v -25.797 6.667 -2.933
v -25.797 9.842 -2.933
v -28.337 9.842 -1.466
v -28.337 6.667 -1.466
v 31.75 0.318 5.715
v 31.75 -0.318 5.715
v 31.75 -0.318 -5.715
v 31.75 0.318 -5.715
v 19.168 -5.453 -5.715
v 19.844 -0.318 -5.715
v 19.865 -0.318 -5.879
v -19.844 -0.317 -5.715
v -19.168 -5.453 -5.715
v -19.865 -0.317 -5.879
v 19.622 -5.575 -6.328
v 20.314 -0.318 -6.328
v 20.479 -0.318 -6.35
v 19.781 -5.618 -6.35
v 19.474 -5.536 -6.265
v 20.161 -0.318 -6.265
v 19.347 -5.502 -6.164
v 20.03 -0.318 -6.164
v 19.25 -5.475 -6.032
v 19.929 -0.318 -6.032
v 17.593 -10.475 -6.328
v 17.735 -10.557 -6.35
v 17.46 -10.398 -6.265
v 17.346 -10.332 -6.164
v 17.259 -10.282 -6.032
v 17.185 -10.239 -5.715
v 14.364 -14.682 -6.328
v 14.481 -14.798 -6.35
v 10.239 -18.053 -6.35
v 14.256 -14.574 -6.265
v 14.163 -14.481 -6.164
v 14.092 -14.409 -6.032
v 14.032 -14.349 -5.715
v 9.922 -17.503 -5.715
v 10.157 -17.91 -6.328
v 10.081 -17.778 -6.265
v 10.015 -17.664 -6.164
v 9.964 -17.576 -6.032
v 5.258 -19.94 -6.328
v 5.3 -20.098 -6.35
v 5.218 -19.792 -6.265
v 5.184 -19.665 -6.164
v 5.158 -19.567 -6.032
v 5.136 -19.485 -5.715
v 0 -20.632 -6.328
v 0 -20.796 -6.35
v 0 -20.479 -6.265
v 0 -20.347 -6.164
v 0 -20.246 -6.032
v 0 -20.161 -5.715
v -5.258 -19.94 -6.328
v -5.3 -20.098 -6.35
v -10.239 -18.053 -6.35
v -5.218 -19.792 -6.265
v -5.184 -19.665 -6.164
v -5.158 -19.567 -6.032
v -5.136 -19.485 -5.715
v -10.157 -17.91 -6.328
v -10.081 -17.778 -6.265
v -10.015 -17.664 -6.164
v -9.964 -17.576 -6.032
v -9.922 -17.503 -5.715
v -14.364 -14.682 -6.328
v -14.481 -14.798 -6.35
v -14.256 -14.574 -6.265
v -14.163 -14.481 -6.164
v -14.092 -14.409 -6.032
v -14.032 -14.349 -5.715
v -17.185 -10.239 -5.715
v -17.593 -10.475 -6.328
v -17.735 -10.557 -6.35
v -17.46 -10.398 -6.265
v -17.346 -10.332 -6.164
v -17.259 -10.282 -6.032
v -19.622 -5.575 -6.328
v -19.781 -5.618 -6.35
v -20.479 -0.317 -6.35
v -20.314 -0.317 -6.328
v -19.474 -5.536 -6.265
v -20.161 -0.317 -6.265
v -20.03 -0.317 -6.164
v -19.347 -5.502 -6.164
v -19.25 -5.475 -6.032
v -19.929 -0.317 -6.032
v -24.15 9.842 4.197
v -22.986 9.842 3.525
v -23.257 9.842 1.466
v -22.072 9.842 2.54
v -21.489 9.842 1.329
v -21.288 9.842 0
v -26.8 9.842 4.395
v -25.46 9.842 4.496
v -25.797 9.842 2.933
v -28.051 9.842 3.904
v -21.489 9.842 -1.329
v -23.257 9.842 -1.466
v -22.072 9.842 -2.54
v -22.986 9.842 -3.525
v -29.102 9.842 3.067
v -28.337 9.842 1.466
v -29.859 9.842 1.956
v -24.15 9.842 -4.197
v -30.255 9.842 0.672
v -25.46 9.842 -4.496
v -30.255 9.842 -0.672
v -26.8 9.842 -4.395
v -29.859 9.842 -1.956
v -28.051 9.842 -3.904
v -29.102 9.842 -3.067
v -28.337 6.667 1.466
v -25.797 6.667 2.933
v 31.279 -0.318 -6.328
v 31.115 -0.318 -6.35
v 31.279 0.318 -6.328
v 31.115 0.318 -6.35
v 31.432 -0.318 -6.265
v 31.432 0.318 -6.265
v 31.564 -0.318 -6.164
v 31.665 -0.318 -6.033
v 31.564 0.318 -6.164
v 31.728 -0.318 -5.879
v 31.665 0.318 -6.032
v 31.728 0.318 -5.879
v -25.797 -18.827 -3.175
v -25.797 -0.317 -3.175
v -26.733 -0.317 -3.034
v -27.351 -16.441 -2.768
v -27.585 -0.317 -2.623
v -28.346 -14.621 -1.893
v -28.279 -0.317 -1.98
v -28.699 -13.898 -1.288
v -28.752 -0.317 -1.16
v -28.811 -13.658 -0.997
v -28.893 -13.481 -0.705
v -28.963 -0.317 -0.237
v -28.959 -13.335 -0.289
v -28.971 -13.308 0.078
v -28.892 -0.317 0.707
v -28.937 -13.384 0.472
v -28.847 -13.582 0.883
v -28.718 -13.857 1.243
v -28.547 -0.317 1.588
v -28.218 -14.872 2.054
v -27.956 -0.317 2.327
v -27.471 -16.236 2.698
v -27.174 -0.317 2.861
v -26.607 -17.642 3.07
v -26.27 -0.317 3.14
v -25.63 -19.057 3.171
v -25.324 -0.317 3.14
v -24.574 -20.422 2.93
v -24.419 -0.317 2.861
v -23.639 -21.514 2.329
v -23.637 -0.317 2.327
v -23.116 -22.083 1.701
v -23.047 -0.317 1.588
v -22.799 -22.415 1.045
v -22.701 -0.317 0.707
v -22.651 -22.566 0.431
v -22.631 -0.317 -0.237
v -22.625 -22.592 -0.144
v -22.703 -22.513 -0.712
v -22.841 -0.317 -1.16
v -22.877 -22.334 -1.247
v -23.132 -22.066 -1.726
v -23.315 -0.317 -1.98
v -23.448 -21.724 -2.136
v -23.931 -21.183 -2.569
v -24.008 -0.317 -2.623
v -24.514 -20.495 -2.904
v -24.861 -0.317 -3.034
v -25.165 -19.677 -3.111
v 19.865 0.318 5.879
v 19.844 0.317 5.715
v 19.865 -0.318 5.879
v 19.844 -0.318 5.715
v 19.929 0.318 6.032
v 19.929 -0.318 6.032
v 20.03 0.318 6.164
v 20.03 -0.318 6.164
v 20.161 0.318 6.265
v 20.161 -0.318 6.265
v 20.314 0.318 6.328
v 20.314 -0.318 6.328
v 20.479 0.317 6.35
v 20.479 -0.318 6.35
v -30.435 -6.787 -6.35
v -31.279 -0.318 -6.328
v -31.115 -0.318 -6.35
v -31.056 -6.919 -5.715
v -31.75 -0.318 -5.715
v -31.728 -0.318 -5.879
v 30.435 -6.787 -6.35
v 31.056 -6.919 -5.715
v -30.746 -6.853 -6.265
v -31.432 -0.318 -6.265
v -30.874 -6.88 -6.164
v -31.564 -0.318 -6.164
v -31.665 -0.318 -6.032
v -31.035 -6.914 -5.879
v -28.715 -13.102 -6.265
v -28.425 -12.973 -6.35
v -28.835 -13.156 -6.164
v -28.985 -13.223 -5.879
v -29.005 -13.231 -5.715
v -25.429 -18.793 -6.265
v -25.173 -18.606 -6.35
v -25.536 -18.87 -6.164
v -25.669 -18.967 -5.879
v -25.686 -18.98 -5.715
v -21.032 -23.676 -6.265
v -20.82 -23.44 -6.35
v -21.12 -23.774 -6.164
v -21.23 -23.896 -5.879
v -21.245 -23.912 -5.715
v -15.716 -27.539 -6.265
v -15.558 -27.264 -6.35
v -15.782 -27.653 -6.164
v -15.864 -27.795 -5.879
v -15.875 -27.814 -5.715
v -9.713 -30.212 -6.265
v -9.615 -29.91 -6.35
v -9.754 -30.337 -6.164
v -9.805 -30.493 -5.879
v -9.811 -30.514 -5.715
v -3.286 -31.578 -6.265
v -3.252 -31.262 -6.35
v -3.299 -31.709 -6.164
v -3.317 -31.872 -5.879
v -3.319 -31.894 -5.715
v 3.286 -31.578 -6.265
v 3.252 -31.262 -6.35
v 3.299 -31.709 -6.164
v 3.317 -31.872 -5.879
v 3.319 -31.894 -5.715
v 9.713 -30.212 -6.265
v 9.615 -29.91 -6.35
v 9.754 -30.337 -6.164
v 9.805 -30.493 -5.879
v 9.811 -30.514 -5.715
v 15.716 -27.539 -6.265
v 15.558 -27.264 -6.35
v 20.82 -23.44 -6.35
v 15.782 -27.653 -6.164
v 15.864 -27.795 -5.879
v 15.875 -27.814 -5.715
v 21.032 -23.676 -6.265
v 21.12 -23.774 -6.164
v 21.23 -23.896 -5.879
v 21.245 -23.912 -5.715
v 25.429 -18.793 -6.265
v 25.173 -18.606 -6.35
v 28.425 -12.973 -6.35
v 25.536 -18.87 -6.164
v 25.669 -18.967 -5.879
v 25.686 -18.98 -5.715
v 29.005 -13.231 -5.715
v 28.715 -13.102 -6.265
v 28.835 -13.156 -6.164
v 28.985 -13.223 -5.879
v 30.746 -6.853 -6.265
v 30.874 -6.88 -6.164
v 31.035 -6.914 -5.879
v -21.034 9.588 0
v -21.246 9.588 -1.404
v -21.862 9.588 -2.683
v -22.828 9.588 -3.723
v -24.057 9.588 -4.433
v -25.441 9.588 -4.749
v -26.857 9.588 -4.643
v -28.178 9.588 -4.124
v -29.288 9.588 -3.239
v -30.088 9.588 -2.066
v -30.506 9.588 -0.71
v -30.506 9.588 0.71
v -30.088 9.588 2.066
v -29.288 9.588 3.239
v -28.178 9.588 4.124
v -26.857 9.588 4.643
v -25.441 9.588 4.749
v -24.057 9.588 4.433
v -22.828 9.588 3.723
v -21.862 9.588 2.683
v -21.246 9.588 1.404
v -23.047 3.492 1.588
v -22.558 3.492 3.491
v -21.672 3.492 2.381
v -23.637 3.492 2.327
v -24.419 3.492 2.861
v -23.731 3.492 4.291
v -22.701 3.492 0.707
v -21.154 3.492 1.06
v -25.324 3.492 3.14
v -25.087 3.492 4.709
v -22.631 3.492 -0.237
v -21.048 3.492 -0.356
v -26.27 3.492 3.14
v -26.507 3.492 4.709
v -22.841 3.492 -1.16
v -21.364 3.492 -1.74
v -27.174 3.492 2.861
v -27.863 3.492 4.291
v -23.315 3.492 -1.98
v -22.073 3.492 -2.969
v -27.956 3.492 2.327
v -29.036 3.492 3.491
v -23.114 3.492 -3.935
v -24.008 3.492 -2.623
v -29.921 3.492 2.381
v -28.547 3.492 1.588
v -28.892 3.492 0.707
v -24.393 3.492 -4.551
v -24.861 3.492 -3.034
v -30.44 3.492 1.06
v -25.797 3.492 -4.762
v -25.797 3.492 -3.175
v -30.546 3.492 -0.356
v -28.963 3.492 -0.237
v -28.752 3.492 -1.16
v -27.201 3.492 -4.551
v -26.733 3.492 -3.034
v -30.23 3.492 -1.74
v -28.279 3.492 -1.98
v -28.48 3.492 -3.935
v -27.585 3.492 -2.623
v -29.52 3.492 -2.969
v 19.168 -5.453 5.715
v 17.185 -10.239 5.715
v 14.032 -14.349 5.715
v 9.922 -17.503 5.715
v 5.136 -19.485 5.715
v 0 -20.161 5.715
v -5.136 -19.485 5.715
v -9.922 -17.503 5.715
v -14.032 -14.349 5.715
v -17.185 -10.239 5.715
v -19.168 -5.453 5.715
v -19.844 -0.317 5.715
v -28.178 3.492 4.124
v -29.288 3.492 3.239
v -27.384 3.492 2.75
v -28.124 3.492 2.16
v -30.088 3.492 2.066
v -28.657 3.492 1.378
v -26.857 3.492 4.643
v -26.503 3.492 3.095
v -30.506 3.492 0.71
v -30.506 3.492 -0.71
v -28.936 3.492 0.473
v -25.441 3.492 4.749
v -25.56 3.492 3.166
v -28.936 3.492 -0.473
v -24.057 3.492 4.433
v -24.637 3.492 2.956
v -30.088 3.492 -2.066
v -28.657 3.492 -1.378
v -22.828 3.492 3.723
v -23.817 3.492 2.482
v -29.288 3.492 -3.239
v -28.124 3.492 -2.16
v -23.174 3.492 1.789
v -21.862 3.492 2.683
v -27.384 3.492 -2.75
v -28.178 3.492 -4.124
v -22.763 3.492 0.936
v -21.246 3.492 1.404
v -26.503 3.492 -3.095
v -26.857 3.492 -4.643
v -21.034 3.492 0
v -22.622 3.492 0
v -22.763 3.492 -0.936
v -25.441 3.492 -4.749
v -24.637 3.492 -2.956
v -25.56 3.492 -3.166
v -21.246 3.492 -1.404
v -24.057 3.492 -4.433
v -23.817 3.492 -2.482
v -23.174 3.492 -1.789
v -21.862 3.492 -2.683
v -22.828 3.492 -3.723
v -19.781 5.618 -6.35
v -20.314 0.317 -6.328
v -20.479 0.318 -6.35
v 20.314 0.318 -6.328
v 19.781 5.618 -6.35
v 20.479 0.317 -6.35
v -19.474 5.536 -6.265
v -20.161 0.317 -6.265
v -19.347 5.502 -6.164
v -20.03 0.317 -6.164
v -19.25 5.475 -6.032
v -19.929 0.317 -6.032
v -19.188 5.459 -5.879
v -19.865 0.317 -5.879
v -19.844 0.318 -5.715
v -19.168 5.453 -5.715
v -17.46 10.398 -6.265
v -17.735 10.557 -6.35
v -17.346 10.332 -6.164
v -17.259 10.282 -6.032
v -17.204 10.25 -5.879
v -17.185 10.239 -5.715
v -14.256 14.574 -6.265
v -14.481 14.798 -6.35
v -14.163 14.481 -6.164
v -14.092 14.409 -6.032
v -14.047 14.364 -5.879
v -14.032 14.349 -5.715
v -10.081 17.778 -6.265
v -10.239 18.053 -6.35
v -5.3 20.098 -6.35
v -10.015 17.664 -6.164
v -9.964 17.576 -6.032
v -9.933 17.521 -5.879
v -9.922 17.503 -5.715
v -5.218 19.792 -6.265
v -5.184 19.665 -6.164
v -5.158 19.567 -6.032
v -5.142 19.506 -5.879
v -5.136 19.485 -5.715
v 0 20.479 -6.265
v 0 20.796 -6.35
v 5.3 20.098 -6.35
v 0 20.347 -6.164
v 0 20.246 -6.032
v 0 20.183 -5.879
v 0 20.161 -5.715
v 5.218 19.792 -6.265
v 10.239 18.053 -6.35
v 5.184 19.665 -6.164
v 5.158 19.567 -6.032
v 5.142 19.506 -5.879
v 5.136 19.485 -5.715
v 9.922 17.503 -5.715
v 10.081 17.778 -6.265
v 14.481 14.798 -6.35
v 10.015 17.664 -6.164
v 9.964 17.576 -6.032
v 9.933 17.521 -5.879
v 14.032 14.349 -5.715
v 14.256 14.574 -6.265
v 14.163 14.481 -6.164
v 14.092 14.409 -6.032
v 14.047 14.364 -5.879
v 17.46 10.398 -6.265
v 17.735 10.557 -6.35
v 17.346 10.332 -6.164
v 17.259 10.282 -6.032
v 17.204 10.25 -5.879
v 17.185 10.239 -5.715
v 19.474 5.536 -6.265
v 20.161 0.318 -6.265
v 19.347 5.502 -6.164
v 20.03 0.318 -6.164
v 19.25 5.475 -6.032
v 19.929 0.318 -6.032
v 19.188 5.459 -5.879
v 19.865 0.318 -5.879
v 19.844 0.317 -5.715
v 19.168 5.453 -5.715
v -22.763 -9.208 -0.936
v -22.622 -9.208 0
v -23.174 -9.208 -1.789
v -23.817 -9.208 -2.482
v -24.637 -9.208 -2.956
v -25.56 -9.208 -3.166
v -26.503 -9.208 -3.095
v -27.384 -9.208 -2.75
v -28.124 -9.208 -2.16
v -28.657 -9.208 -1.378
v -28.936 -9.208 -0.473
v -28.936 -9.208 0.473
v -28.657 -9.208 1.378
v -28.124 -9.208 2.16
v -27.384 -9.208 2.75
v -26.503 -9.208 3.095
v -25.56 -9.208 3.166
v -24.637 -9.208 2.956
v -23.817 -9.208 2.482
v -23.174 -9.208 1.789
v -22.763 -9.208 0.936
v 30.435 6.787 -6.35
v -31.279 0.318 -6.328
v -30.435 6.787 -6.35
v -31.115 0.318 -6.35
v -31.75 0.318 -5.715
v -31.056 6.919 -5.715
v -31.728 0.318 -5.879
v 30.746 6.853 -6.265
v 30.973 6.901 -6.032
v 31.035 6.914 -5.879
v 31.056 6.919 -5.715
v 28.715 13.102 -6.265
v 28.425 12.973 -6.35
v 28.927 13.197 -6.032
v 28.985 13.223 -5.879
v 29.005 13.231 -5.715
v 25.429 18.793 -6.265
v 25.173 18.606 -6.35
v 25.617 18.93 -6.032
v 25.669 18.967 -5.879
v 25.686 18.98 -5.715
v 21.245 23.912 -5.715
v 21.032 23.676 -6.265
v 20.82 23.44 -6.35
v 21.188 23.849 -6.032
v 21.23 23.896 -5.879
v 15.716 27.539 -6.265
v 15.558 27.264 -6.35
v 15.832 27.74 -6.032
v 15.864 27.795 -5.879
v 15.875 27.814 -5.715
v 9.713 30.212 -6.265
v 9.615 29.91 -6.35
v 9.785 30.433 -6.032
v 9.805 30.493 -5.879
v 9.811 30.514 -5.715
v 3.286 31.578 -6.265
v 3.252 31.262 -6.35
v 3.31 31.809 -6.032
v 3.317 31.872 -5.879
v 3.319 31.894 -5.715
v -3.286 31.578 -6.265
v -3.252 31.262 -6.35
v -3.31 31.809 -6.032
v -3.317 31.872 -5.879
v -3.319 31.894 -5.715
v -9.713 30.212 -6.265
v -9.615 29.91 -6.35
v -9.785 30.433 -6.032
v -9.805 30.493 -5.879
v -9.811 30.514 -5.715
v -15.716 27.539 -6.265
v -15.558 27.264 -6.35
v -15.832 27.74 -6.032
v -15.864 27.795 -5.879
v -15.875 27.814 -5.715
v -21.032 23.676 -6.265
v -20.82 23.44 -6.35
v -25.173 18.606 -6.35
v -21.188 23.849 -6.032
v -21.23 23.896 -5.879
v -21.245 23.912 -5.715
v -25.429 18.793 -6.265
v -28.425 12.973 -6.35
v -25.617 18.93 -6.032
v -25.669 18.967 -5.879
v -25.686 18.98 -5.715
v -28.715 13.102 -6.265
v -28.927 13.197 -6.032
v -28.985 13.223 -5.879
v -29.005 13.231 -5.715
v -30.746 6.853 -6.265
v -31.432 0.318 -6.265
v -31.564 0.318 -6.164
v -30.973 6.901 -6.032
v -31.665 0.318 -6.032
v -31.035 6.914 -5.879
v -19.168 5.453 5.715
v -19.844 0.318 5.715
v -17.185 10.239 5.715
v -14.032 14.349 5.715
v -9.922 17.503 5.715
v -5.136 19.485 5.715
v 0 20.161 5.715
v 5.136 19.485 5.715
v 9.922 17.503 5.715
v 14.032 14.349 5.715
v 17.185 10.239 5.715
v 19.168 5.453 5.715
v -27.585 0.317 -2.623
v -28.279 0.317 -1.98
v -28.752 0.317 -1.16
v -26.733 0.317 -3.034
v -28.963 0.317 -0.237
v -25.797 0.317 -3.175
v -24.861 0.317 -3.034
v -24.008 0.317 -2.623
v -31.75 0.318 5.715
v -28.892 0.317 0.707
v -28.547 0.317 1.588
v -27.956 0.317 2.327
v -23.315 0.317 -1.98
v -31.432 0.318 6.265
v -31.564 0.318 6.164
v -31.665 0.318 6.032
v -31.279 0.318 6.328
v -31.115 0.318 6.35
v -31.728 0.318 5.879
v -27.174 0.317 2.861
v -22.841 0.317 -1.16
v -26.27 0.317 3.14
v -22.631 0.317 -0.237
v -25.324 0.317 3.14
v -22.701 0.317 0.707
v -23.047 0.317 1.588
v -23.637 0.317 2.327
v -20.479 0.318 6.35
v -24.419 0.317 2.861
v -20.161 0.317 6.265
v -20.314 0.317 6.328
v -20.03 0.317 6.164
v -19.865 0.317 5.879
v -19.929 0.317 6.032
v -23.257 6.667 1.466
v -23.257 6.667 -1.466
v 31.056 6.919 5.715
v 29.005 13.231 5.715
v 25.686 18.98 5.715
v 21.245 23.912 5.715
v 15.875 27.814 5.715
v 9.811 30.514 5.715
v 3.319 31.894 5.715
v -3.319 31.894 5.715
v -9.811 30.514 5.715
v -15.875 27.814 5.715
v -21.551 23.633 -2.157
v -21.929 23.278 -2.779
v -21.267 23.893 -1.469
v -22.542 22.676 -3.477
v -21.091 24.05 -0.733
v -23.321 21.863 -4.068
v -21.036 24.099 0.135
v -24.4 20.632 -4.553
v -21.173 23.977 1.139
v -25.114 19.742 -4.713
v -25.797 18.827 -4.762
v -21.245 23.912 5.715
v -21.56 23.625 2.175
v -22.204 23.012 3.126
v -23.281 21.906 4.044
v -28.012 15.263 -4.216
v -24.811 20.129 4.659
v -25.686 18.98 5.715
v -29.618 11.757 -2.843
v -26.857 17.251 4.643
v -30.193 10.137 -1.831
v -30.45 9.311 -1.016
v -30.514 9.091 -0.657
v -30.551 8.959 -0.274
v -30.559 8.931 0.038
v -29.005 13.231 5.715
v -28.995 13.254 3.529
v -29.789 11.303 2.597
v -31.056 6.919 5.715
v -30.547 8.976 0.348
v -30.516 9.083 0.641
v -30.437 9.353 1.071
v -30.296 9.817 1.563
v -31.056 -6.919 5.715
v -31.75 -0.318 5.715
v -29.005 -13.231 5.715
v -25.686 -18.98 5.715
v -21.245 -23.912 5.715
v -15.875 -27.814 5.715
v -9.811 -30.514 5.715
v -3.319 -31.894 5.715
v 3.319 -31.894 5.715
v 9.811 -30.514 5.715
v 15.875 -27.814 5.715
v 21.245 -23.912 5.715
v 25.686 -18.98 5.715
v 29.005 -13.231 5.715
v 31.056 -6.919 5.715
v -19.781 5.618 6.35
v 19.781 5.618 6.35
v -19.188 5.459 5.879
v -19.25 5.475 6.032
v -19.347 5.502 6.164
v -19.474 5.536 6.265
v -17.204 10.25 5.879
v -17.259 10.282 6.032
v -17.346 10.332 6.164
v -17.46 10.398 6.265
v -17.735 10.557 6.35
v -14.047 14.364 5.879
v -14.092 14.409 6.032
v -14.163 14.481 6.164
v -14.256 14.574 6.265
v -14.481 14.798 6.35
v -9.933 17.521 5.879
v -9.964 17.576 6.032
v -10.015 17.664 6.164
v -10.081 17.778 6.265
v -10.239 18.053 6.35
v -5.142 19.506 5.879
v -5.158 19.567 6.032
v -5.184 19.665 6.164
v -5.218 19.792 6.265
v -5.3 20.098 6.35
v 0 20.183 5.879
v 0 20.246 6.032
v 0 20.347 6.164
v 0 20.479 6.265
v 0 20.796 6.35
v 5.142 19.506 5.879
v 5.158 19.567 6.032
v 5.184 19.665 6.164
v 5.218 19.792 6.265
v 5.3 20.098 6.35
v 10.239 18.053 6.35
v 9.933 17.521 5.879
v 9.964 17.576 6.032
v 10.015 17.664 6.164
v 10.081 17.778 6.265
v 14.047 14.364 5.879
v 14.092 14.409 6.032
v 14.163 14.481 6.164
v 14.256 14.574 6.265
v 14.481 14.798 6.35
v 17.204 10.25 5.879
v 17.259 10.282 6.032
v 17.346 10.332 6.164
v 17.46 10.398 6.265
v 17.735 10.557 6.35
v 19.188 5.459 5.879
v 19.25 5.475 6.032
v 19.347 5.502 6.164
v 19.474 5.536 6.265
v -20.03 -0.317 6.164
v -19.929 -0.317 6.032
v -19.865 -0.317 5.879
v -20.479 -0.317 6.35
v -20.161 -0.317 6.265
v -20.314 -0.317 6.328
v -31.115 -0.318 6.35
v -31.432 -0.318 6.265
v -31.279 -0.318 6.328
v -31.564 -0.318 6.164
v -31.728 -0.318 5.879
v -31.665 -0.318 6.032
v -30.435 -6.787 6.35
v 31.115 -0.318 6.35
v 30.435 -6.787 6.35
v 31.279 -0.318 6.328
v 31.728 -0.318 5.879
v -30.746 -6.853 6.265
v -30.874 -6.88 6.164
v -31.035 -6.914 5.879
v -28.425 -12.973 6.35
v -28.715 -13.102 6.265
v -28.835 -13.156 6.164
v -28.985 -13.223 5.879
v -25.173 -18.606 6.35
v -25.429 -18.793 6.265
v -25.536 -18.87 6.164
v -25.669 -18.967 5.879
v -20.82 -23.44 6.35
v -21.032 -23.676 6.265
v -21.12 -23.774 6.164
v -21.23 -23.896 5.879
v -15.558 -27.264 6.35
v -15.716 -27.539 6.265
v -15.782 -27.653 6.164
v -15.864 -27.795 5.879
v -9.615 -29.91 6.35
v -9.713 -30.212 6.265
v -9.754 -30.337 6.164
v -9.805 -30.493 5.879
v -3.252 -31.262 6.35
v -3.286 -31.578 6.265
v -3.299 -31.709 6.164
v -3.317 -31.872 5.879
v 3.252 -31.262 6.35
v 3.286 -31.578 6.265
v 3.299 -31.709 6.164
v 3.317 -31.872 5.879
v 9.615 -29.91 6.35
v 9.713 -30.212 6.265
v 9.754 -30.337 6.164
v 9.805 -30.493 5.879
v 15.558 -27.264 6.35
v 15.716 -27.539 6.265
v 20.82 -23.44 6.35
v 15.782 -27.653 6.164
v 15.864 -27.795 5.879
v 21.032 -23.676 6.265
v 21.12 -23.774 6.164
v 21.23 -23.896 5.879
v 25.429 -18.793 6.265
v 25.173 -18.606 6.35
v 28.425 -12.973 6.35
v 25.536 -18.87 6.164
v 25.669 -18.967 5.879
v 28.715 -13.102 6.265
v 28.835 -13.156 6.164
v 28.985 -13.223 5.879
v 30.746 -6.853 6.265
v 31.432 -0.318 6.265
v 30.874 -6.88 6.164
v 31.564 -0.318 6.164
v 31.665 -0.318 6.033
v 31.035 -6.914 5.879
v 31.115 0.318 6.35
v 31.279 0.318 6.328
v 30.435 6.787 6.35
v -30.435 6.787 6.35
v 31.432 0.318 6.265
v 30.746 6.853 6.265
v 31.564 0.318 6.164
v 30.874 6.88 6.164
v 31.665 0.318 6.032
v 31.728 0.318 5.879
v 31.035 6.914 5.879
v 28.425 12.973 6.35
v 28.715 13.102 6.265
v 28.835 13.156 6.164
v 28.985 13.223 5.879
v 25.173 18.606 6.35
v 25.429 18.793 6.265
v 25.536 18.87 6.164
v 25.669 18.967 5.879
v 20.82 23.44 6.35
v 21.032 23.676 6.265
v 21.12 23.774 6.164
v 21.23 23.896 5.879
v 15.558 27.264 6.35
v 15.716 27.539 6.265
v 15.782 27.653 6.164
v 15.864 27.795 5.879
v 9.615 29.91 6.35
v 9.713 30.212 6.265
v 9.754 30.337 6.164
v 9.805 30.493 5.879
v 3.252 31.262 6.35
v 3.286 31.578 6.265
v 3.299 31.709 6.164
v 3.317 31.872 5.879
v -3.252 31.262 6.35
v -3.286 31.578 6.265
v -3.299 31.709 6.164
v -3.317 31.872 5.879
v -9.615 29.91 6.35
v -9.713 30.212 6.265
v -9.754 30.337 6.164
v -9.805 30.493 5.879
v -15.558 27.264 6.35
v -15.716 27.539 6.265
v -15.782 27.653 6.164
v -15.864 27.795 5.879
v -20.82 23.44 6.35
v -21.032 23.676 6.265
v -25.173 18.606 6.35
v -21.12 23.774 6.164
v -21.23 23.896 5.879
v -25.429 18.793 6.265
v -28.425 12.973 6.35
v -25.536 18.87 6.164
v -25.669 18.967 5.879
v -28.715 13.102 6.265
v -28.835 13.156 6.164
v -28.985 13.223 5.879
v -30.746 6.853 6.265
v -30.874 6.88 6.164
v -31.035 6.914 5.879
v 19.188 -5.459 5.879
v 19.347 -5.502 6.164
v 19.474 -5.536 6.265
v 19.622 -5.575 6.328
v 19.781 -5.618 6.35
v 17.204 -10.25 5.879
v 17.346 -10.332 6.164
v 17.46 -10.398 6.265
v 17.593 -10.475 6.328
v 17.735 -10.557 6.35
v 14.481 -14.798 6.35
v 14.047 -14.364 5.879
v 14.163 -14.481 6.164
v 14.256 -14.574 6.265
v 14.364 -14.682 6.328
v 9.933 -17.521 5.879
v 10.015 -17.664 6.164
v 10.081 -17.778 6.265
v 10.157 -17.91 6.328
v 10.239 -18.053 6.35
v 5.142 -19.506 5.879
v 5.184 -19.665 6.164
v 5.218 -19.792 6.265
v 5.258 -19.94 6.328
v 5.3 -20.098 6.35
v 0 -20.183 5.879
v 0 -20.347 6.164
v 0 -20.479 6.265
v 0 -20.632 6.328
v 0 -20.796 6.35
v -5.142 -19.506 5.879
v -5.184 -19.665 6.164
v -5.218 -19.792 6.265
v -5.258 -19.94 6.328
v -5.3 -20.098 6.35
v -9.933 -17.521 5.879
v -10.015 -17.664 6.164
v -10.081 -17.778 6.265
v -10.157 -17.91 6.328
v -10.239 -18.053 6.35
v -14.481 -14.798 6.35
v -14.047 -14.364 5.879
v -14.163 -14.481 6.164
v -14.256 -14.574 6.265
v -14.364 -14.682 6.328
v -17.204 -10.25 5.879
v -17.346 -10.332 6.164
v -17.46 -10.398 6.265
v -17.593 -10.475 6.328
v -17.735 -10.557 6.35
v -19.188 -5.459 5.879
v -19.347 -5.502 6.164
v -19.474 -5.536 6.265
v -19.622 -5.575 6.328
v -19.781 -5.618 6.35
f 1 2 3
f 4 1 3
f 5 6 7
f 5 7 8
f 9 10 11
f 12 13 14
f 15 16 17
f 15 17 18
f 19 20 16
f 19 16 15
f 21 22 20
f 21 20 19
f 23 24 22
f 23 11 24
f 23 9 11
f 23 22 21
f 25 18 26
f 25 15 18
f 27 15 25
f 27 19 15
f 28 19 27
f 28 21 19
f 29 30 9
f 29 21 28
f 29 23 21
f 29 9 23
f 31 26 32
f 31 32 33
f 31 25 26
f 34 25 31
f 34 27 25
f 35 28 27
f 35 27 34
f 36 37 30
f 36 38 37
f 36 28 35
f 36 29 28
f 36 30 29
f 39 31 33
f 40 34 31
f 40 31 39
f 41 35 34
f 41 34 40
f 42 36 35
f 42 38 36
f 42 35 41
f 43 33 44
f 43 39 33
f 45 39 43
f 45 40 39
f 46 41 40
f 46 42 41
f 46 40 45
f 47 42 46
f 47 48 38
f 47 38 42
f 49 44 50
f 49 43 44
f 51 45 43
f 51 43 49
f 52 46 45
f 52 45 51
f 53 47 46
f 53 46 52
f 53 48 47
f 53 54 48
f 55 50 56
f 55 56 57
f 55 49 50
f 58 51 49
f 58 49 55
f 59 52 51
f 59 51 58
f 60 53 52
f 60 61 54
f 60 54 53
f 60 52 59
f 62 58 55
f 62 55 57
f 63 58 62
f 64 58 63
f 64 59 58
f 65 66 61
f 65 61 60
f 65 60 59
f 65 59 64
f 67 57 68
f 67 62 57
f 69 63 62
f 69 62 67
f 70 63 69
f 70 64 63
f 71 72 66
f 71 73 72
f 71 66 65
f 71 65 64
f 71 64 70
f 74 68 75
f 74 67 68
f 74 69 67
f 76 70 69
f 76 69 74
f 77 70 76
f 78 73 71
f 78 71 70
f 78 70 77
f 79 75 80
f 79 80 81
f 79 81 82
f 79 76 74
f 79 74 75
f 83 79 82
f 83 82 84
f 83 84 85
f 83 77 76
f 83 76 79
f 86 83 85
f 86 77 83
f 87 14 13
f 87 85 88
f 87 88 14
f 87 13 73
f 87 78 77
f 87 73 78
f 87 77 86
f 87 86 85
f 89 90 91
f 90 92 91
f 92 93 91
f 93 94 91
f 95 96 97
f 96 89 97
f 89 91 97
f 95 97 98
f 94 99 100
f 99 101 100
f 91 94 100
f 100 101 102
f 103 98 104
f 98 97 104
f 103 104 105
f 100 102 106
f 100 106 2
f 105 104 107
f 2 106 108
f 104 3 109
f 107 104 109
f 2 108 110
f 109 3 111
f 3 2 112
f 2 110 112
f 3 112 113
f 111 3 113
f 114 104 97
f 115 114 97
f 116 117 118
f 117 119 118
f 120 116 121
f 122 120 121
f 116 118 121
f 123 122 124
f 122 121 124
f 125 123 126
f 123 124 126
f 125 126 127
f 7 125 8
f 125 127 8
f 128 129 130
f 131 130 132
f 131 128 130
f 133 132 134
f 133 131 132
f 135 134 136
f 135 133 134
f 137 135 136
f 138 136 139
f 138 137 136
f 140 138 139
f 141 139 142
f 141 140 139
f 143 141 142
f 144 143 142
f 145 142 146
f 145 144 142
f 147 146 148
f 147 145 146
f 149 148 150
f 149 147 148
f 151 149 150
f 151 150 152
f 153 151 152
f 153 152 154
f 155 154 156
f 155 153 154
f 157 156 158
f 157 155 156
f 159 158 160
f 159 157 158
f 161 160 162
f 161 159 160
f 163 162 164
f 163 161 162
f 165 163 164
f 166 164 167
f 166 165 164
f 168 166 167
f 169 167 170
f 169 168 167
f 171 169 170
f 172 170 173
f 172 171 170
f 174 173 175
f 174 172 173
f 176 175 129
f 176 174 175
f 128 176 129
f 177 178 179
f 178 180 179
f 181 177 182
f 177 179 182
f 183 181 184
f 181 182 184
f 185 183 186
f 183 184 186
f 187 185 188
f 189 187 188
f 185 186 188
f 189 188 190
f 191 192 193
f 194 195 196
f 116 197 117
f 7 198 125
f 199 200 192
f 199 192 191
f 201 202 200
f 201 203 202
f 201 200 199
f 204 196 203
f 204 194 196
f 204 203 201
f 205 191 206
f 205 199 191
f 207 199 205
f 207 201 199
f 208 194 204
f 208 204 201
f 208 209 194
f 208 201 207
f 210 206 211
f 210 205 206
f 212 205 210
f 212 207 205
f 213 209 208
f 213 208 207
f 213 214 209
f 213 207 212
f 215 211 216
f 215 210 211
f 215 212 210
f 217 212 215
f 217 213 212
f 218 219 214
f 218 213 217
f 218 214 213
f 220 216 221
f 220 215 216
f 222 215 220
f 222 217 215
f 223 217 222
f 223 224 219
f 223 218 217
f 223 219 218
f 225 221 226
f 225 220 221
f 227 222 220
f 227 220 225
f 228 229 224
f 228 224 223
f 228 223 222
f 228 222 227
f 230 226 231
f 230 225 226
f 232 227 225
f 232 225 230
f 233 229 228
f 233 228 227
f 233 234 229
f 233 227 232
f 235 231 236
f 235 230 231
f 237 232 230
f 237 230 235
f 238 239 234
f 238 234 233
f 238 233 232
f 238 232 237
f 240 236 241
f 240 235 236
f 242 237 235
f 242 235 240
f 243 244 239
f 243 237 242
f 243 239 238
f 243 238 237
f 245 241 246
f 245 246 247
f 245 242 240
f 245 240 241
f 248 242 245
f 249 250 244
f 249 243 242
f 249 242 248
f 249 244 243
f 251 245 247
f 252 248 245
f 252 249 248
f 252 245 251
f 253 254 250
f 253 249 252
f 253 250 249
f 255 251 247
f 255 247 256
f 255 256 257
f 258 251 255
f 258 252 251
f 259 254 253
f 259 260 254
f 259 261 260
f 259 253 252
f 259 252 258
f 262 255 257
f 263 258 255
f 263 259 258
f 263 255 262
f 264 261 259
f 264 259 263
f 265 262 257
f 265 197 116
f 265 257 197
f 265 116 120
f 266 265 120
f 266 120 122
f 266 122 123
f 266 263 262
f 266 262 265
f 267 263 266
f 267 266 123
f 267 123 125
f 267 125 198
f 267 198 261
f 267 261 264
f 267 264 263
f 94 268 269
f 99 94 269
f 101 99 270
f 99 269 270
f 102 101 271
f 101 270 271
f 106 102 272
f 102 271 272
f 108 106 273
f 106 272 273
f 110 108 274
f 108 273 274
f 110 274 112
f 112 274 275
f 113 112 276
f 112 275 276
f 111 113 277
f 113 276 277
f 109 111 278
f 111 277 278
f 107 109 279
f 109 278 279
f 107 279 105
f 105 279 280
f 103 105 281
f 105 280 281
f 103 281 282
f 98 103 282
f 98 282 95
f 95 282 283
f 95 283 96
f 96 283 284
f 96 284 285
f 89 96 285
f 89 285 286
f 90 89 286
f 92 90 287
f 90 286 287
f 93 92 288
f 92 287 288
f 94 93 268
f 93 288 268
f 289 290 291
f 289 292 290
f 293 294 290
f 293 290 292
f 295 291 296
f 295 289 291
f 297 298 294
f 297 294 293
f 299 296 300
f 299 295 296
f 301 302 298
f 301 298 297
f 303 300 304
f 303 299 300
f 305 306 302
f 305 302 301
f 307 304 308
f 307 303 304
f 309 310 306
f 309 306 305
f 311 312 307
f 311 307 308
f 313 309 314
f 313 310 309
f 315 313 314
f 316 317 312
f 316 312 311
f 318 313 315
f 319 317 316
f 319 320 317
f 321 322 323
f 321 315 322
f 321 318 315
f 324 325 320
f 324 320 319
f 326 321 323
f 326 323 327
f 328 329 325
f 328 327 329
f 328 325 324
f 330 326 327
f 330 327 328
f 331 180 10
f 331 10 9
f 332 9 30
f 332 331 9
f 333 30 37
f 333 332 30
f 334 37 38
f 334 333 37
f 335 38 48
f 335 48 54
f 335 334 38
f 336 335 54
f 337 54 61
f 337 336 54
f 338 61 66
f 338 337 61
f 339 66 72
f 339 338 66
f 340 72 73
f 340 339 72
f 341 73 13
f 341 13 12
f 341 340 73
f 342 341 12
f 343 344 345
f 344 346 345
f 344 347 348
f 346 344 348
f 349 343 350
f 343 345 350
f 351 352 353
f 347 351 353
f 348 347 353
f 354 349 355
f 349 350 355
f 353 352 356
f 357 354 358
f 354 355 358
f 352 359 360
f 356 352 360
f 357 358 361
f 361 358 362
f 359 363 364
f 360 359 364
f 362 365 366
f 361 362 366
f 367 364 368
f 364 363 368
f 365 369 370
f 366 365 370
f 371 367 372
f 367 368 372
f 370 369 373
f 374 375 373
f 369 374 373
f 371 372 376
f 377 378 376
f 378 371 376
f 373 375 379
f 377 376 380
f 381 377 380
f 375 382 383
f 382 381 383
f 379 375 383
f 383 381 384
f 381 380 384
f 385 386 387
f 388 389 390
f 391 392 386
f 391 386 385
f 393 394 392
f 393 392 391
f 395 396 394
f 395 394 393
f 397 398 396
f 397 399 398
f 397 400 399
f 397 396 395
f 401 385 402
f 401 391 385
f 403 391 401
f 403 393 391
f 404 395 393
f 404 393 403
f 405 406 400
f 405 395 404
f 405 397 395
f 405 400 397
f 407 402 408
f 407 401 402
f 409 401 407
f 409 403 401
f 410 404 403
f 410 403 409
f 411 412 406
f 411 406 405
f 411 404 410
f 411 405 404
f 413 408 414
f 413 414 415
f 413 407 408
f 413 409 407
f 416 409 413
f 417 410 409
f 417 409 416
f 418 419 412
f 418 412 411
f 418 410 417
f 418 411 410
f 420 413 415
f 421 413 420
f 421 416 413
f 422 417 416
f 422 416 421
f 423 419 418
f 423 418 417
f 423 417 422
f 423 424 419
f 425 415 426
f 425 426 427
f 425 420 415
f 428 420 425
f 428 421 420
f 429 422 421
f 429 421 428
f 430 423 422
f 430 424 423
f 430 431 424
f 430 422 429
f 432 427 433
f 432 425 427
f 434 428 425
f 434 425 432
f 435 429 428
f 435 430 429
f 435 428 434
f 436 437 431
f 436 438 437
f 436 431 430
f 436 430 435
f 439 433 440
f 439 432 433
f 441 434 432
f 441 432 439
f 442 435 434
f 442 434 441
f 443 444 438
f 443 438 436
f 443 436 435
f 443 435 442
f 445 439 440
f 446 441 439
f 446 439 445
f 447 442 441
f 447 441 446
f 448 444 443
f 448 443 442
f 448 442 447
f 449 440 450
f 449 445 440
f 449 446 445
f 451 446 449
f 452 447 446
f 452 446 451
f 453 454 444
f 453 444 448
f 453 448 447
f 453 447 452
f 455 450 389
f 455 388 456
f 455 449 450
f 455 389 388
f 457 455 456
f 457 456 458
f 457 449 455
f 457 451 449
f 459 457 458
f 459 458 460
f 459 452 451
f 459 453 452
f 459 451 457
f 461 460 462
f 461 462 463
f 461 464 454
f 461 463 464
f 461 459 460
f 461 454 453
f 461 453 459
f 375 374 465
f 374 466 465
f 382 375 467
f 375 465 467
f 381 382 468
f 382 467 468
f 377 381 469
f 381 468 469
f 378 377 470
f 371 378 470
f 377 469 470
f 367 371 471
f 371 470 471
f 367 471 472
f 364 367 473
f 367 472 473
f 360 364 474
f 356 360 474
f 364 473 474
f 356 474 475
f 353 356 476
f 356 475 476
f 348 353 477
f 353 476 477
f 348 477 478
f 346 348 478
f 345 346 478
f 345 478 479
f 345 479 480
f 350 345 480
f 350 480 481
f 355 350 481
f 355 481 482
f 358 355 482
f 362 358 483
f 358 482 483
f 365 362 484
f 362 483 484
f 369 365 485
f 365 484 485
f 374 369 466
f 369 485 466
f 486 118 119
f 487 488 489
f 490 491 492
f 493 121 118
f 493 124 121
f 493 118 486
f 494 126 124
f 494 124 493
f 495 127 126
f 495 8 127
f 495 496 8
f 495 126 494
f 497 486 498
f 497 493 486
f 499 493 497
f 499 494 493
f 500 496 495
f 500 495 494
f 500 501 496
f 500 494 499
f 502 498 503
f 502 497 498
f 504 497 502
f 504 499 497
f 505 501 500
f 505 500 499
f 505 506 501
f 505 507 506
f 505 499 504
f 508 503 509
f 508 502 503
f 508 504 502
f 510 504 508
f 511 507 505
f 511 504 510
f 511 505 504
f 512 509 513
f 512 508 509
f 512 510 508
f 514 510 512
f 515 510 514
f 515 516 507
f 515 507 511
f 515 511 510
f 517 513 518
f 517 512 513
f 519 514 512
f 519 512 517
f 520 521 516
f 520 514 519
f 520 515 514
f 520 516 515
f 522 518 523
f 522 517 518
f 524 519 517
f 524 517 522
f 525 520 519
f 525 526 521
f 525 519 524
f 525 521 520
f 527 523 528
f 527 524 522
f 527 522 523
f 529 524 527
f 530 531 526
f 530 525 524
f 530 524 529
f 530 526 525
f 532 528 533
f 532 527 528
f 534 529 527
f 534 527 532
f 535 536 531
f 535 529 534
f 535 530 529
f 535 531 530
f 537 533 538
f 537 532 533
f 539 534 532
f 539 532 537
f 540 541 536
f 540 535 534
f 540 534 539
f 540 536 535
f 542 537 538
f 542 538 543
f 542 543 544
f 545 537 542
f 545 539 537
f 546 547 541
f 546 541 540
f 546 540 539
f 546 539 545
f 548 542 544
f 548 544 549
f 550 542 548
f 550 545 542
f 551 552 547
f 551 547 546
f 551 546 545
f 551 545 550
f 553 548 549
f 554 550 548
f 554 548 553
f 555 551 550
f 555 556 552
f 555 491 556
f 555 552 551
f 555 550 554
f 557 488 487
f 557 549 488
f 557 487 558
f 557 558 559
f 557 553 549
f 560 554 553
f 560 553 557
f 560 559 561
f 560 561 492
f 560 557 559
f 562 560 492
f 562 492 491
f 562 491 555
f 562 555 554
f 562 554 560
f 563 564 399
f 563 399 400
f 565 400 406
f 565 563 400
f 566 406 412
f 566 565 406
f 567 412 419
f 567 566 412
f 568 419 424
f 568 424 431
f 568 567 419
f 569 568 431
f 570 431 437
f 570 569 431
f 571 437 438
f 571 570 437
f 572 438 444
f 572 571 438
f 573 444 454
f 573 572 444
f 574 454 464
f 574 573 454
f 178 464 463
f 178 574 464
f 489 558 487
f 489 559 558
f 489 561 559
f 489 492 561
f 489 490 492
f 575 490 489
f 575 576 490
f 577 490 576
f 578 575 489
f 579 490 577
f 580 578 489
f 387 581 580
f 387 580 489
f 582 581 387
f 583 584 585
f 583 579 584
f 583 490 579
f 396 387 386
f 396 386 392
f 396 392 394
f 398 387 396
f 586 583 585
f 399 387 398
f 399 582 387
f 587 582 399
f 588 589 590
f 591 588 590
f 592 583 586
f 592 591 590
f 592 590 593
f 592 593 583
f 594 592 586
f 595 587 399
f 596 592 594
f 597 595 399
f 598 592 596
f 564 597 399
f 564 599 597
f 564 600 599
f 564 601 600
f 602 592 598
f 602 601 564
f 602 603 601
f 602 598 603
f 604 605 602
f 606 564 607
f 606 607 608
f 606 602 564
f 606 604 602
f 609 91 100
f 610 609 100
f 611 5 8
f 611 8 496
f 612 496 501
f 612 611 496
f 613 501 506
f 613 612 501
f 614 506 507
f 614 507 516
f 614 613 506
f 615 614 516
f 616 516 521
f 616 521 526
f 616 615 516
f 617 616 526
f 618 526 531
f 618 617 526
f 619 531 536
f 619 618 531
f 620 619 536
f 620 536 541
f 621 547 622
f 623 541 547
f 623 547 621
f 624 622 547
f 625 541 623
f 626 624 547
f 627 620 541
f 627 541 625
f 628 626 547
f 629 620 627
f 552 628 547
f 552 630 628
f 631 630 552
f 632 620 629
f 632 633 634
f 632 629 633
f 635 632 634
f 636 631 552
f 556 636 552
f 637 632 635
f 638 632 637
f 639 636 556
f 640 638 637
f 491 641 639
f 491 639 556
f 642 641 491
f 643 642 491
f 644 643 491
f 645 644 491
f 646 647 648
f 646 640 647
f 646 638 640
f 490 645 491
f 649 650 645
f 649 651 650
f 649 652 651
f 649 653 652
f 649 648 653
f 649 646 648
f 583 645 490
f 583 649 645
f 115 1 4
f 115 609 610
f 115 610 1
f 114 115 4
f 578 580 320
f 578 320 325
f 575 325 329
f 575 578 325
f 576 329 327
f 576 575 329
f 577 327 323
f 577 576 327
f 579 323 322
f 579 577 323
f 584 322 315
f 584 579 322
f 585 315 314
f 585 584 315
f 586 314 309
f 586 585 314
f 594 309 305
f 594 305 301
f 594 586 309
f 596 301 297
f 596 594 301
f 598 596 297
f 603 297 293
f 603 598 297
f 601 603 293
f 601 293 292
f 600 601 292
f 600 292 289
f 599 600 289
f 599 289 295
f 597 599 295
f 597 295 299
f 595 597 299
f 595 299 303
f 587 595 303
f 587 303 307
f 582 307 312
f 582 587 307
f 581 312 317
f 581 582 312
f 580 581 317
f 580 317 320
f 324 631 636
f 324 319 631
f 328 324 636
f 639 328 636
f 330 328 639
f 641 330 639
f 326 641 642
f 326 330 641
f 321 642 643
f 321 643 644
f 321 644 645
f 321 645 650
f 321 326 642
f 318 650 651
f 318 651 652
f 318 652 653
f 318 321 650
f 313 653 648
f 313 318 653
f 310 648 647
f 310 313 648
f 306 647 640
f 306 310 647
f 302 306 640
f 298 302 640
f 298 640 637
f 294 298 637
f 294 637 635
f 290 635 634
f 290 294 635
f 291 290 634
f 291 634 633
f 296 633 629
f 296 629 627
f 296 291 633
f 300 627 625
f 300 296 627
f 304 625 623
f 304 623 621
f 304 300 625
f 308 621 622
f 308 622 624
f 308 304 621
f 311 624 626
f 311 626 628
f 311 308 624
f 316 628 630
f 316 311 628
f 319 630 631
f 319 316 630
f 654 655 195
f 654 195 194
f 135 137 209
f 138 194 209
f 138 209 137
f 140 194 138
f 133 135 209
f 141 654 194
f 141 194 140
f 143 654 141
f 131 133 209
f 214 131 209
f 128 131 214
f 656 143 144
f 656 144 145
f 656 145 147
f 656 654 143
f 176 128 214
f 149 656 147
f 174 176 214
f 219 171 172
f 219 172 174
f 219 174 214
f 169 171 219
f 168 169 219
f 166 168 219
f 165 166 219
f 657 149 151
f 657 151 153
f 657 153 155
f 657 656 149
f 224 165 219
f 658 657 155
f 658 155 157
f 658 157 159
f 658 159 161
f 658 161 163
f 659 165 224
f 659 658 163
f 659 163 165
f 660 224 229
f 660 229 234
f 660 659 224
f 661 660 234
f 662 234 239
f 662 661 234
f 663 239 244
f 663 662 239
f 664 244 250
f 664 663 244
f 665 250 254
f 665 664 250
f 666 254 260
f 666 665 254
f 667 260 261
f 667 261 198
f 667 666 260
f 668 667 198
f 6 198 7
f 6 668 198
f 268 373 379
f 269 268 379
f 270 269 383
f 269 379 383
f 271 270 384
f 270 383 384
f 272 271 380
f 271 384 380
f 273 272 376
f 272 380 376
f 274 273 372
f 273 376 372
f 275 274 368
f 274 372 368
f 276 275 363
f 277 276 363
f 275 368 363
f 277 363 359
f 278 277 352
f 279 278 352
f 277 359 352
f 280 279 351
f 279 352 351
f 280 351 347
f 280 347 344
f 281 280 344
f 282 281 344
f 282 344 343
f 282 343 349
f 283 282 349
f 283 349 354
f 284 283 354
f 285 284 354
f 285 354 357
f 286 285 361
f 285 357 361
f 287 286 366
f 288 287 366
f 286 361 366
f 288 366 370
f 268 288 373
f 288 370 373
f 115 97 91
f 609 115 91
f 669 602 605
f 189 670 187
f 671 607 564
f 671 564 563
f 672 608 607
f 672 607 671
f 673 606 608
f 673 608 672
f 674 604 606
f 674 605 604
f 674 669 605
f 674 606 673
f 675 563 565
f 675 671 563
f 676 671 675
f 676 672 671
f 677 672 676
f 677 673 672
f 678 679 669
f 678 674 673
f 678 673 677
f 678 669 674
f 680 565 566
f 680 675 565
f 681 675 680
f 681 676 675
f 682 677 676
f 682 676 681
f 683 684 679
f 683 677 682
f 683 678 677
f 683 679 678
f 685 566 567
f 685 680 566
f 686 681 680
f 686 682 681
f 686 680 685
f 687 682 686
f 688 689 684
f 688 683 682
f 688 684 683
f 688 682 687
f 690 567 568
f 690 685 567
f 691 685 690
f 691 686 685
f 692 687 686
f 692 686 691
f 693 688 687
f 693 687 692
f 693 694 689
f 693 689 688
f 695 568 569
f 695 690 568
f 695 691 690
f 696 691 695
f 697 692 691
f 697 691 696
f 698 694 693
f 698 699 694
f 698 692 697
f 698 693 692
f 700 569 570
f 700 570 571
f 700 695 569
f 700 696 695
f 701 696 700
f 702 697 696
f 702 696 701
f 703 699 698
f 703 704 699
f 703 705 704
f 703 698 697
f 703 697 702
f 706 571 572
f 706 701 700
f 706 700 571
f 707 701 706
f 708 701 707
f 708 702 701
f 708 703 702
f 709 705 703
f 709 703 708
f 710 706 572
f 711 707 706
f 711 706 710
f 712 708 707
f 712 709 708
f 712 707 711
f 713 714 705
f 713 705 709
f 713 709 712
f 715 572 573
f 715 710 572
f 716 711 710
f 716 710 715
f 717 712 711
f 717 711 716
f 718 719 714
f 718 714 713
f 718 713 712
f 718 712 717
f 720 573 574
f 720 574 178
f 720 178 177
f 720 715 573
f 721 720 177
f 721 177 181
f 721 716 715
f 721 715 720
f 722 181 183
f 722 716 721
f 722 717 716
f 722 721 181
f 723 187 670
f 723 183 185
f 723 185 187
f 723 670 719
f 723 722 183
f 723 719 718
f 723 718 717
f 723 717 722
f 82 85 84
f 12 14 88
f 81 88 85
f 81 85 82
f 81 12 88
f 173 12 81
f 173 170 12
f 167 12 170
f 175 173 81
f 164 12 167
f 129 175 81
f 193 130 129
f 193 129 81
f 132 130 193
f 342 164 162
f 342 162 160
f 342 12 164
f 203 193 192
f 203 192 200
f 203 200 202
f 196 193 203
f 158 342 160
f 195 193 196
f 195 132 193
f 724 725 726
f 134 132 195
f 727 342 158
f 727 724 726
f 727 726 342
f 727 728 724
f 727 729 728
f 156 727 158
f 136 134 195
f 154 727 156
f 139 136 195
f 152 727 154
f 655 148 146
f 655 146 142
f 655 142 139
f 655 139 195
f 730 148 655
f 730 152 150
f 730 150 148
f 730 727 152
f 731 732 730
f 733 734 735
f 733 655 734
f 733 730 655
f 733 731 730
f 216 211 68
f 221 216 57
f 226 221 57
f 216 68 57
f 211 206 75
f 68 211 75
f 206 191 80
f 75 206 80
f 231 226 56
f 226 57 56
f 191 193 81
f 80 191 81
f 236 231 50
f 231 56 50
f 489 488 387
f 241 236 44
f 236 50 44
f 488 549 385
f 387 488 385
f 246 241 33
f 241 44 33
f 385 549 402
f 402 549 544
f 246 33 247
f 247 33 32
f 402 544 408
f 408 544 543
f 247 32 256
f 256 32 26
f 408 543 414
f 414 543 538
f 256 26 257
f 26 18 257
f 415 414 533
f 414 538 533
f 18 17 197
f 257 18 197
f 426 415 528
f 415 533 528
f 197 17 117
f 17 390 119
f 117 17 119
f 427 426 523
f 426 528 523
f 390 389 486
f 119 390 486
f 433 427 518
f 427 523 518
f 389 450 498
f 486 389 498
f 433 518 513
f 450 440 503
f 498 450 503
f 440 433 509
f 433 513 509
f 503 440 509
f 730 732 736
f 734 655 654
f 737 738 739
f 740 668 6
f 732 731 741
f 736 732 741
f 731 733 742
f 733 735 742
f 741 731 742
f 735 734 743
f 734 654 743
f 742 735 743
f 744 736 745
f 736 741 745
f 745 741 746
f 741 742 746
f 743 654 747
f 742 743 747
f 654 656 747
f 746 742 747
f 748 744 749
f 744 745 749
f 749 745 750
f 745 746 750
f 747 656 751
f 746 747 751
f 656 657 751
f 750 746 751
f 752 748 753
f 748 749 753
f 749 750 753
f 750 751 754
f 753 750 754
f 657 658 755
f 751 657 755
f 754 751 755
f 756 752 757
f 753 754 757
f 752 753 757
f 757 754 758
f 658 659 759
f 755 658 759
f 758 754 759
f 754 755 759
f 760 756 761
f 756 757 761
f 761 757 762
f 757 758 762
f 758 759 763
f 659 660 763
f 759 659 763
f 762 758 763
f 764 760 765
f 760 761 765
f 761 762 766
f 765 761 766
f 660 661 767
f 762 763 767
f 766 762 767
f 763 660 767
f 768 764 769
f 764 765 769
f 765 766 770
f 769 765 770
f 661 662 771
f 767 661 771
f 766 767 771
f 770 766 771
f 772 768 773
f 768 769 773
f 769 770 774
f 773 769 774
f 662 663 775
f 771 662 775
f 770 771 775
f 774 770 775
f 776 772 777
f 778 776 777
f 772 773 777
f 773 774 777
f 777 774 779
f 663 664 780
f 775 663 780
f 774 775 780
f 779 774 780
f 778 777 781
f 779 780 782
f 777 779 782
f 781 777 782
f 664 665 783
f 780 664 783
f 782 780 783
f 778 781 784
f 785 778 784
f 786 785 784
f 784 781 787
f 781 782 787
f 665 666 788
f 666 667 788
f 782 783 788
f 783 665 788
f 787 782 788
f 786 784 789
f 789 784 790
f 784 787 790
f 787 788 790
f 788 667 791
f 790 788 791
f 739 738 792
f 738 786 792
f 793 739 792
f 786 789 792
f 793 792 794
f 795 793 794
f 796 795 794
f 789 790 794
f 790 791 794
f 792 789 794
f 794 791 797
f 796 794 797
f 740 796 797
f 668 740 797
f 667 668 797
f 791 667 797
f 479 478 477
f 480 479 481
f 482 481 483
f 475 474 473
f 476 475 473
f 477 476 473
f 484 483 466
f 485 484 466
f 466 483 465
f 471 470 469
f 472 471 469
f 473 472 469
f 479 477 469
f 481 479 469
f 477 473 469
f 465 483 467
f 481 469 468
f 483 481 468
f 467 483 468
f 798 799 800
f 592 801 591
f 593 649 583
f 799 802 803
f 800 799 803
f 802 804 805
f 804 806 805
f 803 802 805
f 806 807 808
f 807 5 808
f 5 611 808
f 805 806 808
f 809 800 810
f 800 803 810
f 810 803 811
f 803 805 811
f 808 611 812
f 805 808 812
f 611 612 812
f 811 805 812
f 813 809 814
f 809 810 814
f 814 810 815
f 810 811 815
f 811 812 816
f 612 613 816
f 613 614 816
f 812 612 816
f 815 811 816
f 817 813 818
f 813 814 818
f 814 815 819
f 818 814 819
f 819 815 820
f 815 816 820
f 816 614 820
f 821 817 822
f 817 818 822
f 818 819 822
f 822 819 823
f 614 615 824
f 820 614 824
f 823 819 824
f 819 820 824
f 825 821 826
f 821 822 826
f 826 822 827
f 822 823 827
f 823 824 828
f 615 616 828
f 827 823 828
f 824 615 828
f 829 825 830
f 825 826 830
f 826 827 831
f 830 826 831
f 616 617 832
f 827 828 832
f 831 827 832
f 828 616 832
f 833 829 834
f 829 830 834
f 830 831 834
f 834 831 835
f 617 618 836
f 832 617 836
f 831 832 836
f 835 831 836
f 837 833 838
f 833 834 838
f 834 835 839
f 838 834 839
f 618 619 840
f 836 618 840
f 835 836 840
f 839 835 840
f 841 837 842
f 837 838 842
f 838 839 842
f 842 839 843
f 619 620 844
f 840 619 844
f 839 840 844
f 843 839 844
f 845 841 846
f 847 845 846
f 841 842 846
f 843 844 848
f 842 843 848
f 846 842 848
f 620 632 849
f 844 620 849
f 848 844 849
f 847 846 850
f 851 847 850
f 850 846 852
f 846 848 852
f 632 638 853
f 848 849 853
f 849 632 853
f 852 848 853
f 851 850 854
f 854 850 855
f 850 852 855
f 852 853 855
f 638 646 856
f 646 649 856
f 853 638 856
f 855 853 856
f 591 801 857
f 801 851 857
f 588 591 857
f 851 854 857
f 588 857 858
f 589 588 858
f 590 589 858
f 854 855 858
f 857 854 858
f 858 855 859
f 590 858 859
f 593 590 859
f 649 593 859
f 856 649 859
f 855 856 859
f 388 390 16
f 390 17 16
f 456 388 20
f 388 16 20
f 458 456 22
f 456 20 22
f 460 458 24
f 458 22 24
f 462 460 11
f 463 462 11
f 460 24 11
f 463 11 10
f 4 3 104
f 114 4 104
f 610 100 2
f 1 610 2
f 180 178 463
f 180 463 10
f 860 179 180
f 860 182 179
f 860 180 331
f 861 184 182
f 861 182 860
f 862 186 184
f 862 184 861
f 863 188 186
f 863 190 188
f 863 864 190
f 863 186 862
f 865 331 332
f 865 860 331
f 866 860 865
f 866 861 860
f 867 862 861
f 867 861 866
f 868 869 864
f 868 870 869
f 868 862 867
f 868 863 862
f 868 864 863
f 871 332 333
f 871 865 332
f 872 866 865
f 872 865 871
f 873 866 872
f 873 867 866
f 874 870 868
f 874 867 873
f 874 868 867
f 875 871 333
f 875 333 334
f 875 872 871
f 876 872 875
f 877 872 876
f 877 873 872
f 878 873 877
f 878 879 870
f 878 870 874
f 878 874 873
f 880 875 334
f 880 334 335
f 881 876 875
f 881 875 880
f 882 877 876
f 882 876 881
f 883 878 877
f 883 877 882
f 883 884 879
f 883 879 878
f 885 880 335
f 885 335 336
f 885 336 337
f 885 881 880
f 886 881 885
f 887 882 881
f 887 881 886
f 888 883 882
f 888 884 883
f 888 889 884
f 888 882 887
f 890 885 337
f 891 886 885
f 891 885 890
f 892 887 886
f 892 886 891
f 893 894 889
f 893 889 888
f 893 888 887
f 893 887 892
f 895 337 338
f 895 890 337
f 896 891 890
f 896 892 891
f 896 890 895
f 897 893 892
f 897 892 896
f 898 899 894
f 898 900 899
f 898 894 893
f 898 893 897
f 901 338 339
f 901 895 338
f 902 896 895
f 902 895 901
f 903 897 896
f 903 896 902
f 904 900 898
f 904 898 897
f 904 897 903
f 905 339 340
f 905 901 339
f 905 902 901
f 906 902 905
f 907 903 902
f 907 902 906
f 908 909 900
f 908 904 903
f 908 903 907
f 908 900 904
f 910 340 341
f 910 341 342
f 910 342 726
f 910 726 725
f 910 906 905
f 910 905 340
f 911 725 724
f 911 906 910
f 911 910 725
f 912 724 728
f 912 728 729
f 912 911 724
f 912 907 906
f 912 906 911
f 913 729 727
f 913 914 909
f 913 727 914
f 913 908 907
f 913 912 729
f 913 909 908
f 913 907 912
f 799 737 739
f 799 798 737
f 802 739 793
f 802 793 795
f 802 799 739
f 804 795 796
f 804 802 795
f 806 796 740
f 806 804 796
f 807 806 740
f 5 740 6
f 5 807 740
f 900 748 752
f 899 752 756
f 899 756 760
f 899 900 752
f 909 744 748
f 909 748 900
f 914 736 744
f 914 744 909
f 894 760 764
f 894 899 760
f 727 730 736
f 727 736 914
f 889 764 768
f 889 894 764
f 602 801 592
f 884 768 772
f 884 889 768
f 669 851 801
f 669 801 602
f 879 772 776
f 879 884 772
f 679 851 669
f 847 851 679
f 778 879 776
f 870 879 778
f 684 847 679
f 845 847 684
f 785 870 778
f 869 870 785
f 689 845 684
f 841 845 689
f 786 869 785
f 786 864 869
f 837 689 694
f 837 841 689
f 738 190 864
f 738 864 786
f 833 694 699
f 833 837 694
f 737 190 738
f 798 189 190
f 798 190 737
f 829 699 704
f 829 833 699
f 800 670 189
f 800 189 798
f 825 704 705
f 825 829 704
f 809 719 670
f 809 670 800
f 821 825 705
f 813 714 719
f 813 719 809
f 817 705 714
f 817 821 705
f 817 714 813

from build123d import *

# Parameters (mm, degrees)
EXTRUDE1_DEPTH     = 6.35
CUT_EXTRUDE2_DEPTH = 3.175
FILLET1_R          = 0.635
CHAMFER2_SIZE      = 0.254


with BuildPart() as part:
    # Sketch1 → Extrude1 (new, symmetric)
    with BuildSketch(Plane.XY):
        with BuildLine():
            Line((-31.75, 0.3175), (-19.84375, 0.3175))
            ThreePointArc((-19.84375, 0.3175), (0, 20.16125), (19.84375, 0.3175))
            Line((19.84375, 0.3175), (19.84375, -0.3175))
            ThreePointArc((19.84375, -0.3175), (0, -20.16125), (-19.84375, -0.3175))
            Line((-19.84375, -0.3175), (-31.75, -0.3175))
            ThreePointArc((-31.75, -0.3175), (0, -32.0675), (31.75, -0.3175))
            Line((31.75, -0.3175), (31.75, 0.3175))
            ThreePointArc((31.75, 0.3175), (0, 32.0675), (-31.75, 0.3175))
        make_face()
    extrude(amount=EXTRUDE1_DEPTH, both=True)

    # Sketch4 → Cut-Revolve1 (revolve, cut)
    with BuildSketch(Plane.XY, mode=Mode.PRIVATE) as cut_revolve1_sk:
        Polygon((-25.796875, 32.0675), (-21.034375, 32.0675), (-21.034375, 3.4925), (-22.621875, 3.4925), (-22.621875, -32.0675), (-25.796875, -32.0675), align=None)
    revolve(cut_revolve1_sk.sketch.rotate(Axis((-25.796875, -32.0675, 0), (0, 1, 0)), 90), axis=Axis((-25.796875, -32.0675, 0), (0, 1, 0)), mode=Mode.SUBTRACT)

    # Fillet1
    fillet1_edges = [part.edges().sort_by_distance(p)[0] for p in [
        (0, 20.16125, 6.35),
        (19.84375, 0, 6.35),
        (0, -20.16125, 6.35),
        (0, -32.0675, 6.35),
        (31.75, 0, 6.35),
        (0, 32.0675, 6.35),
        (31.75, 0, -6.35),
        (0, -32.0675, -6.35),
        (0, -20.16125, -6.35),
        (19.84375, 0, -6.35),
        (0, 20.16125, -6.35),
        (0, 32.0675, -6.35),
    ]]
    fillet(fillet1_edges, radius=FILLET1_R)


with BuildPart() as body_2:
    # Sketch6 → Revolve1 (revolve)
    with BuildSketch(Plane.XY):
        Polygon((-25.796875, 9.8425), (-21.034375, 9.8425), (-21.034375, 3.4925), (-22.621875, 3.4925), (-22.621875, -9.2075), (-25.796875, -9.2075), align=None)
    revolve(axis=Axis((-25.796875, -9.2075, 0), (0, 1, 0)))

    # Sketch7 → Cut-Extrude2 (cut)
    with BuildSketch(Plane(origin=(0, 9.8425, 0), x_dir=(-1, 0, 0), z_dir=(0, 1, 0))):
        Polygon((25.796875, -2.932939367), (28.336875, -1.466469684), (28.336875, 1.466469684), (25.796875, 2.932939367), (23.256875, 1.466469684), (23.256875, -1.466469684), align=None)
    extrude(amount=-CUT_EXTRUDE2_DEPTH, mode=Mode.SUBTRACT)

    # Chamfer2
    chamfer2_edges = [body_2.edges().sort_by_distance(p)[0] for p in [
        (-30.559375, 9.8425, 0),
    ]]
    chamfer(chamfer2_edges, length=CHAMFER2_SIZE)


solid = Compound([part.part, body_2.part])
